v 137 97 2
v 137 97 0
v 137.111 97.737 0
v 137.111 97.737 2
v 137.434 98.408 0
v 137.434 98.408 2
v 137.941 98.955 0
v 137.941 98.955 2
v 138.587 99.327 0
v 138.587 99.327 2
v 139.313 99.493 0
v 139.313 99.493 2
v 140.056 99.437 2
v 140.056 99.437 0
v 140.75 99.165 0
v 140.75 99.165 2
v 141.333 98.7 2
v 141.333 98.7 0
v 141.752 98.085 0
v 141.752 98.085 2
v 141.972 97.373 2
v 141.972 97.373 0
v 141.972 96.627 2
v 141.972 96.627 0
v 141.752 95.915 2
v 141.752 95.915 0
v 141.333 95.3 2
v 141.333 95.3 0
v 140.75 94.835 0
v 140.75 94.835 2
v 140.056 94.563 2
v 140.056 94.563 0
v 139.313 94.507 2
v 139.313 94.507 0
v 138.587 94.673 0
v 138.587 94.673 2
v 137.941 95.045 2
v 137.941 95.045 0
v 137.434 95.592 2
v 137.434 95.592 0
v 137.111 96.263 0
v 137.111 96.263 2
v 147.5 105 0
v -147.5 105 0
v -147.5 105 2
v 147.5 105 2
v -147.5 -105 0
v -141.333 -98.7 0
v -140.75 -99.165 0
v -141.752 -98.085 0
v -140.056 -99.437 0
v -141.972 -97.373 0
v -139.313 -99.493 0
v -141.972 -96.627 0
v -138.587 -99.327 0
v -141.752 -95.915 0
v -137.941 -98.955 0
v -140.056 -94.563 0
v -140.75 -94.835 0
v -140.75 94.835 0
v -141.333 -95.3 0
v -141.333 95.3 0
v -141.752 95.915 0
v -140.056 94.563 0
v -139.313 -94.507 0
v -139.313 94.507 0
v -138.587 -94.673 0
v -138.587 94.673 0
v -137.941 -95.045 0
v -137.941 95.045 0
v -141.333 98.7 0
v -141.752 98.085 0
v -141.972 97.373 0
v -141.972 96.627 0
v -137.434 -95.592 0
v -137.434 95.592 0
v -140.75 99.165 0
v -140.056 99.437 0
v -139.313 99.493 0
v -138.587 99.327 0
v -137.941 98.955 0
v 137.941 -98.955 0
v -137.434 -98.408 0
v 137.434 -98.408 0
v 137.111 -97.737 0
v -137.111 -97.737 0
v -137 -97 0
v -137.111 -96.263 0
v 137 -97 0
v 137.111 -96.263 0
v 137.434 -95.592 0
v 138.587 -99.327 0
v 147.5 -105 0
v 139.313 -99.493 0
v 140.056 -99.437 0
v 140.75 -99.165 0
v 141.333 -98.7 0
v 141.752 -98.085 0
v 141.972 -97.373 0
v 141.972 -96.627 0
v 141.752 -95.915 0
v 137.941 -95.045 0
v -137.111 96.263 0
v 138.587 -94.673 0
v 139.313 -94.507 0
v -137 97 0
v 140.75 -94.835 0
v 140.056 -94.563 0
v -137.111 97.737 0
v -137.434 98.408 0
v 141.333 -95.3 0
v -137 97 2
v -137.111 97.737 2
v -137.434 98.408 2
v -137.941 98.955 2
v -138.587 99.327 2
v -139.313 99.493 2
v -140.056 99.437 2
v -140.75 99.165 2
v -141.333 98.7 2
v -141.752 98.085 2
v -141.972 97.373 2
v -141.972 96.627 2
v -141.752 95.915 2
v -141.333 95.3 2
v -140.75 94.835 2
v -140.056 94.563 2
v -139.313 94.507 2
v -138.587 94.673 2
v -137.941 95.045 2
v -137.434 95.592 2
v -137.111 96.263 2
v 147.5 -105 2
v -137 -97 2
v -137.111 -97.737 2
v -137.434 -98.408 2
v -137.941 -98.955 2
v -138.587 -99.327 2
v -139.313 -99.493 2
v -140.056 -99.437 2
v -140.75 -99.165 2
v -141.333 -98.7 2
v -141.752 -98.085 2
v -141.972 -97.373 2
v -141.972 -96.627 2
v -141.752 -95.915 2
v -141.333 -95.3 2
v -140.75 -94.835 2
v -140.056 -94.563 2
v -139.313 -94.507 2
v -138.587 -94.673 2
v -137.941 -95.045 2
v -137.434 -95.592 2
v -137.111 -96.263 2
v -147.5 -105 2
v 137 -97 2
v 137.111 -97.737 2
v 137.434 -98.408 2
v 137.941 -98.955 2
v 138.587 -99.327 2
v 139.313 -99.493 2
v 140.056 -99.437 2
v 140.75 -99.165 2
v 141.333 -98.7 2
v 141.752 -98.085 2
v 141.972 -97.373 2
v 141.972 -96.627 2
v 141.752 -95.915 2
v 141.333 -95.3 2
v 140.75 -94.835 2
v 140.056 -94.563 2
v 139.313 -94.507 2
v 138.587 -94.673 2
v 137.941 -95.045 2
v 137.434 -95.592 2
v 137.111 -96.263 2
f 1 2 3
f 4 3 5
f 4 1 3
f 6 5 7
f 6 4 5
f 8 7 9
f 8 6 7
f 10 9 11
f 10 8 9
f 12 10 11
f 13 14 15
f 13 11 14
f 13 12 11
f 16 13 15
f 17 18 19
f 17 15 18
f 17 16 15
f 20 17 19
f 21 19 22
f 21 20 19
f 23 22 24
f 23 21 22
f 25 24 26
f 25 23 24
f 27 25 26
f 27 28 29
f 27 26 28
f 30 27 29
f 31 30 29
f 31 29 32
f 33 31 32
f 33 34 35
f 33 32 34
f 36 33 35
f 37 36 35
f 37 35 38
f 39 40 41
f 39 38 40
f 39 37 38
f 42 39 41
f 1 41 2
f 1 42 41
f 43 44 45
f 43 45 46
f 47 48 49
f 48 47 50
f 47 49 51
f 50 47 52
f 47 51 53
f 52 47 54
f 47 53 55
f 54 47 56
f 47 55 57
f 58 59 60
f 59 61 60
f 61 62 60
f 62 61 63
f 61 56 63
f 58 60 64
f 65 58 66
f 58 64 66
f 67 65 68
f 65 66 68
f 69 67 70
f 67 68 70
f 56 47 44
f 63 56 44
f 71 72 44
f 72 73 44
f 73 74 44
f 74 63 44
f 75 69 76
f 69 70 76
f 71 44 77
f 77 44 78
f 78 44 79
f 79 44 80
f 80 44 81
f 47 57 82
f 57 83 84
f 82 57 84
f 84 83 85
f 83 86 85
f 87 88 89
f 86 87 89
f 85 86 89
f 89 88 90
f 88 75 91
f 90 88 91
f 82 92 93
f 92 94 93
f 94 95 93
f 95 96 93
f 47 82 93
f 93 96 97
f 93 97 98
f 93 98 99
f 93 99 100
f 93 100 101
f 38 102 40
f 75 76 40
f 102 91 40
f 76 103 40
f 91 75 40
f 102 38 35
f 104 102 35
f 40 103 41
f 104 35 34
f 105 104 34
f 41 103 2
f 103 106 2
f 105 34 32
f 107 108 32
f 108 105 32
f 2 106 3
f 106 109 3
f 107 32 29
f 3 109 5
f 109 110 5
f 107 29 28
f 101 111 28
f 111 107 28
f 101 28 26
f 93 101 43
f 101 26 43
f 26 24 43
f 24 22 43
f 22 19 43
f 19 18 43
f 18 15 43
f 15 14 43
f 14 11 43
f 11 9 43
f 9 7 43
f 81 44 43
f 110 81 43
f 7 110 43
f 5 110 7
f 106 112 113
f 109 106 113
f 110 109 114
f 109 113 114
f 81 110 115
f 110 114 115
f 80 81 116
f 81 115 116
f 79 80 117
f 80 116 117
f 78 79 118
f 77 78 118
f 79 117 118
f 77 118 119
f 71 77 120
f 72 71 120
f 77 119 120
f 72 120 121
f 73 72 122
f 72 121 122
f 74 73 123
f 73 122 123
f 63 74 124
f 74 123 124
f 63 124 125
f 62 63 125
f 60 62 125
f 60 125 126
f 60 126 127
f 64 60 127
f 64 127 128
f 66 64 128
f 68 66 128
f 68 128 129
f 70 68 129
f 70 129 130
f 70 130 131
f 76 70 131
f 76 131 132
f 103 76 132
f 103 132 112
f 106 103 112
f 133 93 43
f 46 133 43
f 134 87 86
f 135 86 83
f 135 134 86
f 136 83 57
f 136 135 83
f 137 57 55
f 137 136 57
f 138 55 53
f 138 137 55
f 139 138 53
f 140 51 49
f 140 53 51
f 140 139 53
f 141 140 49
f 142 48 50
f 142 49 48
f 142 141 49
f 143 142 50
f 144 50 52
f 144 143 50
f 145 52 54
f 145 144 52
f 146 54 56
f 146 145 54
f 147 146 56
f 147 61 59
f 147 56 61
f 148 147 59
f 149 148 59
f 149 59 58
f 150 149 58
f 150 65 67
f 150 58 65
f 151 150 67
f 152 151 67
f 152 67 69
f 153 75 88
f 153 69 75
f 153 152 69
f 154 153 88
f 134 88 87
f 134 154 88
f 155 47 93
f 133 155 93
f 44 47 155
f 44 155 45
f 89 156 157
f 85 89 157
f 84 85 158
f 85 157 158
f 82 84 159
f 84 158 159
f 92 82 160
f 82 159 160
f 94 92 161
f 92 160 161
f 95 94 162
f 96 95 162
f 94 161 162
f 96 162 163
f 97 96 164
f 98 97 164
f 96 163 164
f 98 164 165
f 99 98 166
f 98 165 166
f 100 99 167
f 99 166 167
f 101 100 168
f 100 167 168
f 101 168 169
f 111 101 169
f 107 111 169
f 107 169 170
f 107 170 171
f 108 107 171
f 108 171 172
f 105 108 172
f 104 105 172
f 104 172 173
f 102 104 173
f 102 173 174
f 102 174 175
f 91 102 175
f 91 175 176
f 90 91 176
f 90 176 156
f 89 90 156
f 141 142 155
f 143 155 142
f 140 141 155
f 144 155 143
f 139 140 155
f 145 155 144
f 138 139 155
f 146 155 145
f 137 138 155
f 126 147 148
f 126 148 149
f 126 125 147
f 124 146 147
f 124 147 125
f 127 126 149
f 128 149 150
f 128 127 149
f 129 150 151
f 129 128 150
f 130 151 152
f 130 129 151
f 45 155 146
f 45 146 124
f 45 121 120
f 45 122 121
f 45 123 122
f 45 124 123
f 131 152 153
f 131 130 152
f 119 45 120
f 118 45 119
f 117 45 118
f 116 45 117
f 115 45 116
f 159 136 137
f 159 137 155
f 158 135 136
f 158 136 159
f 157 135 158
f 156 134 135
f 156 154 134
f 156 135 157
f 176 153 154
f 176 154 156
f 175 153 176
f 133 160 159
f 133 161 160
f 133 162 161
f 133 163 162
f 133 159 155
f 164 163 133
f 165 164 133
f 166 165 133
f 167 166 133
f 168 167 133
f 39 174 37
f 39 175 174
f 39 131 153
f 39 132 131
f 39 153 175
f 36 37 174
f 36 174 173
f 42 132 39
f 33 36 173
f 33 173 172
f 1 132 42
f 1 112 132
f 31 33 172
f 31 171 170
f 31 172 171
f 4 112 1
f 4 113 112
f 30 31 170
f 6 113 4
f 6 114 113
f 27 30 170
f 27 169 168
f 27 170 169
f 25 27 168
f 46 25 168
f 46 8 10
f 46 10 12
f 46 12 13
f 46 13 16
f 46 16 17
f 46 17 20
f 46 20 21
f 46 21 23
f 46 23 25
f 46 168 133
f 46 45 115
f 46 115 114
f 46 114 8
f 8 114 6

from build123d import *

# Parameters (mm, degrees)
SKETCH2_W               = 295
SKETCH2_H               = 210
BOSS_EXTRUDE1_DEPTH     = 2
SKETCH3_R               = 2.5
CUT_EXTRUDE1_DEPTH      = 10
MIRROR2_COPY_1_SKETCH_R = 2.5
MIRROR2_COPY_1_DEPTH    = 10


with BuildPart() as part:
    # Sketch2 → Boss-Extrude1 (new body)
    with BuildSketch(Plane.XY):
        Rectangle(SKETCH2_W, SKETCH2_H)
    extrude(amount=BOSS_EXTRUDE1_DEPTH)

    # Sketch3 → Cut-Extrude1 (cut)
    with BuildSketch(Plane.XY.offset(2)):
        with Locations((-139.5, 97)):
            Circle(SKETCH3_R)
    cut_extrude1 = extrude(amount=-CUT_EXTRUDE1_DEPTH, mode=Mode.SUBTRACT)

    # Mirror1: Cut-Extrude1 across plane
    add(cut_extrude1.mirror(Plane(origin=(0, 0, 0), x_dir=(0, 0, 1), z_dir=(1, 0, 0))), mode=Mode.SUBTRACT)

    # Mirror2: Cut-Extrude1 across plane
    add(cut_extrude1.mirror(Plane.ZX), mode=Mode.SUBTRACT)

    # Mirror2 copy 1 sketch → Mirror2 copy 1 (cut)
    with BuildSketch(Plane(origin=(0, 0, 2), x_dir=(-1, 0, 0), z_dir=(0, 0, 1))):
        with Locations((-139.5, 97)):
            Circle(MIRROR2_COPY_1_SKETCH_R)
    extrude(amount=-MIRROR2_COPY_1_DEPTH, mode=Mode.SUBTRACT)


solid = part.part
